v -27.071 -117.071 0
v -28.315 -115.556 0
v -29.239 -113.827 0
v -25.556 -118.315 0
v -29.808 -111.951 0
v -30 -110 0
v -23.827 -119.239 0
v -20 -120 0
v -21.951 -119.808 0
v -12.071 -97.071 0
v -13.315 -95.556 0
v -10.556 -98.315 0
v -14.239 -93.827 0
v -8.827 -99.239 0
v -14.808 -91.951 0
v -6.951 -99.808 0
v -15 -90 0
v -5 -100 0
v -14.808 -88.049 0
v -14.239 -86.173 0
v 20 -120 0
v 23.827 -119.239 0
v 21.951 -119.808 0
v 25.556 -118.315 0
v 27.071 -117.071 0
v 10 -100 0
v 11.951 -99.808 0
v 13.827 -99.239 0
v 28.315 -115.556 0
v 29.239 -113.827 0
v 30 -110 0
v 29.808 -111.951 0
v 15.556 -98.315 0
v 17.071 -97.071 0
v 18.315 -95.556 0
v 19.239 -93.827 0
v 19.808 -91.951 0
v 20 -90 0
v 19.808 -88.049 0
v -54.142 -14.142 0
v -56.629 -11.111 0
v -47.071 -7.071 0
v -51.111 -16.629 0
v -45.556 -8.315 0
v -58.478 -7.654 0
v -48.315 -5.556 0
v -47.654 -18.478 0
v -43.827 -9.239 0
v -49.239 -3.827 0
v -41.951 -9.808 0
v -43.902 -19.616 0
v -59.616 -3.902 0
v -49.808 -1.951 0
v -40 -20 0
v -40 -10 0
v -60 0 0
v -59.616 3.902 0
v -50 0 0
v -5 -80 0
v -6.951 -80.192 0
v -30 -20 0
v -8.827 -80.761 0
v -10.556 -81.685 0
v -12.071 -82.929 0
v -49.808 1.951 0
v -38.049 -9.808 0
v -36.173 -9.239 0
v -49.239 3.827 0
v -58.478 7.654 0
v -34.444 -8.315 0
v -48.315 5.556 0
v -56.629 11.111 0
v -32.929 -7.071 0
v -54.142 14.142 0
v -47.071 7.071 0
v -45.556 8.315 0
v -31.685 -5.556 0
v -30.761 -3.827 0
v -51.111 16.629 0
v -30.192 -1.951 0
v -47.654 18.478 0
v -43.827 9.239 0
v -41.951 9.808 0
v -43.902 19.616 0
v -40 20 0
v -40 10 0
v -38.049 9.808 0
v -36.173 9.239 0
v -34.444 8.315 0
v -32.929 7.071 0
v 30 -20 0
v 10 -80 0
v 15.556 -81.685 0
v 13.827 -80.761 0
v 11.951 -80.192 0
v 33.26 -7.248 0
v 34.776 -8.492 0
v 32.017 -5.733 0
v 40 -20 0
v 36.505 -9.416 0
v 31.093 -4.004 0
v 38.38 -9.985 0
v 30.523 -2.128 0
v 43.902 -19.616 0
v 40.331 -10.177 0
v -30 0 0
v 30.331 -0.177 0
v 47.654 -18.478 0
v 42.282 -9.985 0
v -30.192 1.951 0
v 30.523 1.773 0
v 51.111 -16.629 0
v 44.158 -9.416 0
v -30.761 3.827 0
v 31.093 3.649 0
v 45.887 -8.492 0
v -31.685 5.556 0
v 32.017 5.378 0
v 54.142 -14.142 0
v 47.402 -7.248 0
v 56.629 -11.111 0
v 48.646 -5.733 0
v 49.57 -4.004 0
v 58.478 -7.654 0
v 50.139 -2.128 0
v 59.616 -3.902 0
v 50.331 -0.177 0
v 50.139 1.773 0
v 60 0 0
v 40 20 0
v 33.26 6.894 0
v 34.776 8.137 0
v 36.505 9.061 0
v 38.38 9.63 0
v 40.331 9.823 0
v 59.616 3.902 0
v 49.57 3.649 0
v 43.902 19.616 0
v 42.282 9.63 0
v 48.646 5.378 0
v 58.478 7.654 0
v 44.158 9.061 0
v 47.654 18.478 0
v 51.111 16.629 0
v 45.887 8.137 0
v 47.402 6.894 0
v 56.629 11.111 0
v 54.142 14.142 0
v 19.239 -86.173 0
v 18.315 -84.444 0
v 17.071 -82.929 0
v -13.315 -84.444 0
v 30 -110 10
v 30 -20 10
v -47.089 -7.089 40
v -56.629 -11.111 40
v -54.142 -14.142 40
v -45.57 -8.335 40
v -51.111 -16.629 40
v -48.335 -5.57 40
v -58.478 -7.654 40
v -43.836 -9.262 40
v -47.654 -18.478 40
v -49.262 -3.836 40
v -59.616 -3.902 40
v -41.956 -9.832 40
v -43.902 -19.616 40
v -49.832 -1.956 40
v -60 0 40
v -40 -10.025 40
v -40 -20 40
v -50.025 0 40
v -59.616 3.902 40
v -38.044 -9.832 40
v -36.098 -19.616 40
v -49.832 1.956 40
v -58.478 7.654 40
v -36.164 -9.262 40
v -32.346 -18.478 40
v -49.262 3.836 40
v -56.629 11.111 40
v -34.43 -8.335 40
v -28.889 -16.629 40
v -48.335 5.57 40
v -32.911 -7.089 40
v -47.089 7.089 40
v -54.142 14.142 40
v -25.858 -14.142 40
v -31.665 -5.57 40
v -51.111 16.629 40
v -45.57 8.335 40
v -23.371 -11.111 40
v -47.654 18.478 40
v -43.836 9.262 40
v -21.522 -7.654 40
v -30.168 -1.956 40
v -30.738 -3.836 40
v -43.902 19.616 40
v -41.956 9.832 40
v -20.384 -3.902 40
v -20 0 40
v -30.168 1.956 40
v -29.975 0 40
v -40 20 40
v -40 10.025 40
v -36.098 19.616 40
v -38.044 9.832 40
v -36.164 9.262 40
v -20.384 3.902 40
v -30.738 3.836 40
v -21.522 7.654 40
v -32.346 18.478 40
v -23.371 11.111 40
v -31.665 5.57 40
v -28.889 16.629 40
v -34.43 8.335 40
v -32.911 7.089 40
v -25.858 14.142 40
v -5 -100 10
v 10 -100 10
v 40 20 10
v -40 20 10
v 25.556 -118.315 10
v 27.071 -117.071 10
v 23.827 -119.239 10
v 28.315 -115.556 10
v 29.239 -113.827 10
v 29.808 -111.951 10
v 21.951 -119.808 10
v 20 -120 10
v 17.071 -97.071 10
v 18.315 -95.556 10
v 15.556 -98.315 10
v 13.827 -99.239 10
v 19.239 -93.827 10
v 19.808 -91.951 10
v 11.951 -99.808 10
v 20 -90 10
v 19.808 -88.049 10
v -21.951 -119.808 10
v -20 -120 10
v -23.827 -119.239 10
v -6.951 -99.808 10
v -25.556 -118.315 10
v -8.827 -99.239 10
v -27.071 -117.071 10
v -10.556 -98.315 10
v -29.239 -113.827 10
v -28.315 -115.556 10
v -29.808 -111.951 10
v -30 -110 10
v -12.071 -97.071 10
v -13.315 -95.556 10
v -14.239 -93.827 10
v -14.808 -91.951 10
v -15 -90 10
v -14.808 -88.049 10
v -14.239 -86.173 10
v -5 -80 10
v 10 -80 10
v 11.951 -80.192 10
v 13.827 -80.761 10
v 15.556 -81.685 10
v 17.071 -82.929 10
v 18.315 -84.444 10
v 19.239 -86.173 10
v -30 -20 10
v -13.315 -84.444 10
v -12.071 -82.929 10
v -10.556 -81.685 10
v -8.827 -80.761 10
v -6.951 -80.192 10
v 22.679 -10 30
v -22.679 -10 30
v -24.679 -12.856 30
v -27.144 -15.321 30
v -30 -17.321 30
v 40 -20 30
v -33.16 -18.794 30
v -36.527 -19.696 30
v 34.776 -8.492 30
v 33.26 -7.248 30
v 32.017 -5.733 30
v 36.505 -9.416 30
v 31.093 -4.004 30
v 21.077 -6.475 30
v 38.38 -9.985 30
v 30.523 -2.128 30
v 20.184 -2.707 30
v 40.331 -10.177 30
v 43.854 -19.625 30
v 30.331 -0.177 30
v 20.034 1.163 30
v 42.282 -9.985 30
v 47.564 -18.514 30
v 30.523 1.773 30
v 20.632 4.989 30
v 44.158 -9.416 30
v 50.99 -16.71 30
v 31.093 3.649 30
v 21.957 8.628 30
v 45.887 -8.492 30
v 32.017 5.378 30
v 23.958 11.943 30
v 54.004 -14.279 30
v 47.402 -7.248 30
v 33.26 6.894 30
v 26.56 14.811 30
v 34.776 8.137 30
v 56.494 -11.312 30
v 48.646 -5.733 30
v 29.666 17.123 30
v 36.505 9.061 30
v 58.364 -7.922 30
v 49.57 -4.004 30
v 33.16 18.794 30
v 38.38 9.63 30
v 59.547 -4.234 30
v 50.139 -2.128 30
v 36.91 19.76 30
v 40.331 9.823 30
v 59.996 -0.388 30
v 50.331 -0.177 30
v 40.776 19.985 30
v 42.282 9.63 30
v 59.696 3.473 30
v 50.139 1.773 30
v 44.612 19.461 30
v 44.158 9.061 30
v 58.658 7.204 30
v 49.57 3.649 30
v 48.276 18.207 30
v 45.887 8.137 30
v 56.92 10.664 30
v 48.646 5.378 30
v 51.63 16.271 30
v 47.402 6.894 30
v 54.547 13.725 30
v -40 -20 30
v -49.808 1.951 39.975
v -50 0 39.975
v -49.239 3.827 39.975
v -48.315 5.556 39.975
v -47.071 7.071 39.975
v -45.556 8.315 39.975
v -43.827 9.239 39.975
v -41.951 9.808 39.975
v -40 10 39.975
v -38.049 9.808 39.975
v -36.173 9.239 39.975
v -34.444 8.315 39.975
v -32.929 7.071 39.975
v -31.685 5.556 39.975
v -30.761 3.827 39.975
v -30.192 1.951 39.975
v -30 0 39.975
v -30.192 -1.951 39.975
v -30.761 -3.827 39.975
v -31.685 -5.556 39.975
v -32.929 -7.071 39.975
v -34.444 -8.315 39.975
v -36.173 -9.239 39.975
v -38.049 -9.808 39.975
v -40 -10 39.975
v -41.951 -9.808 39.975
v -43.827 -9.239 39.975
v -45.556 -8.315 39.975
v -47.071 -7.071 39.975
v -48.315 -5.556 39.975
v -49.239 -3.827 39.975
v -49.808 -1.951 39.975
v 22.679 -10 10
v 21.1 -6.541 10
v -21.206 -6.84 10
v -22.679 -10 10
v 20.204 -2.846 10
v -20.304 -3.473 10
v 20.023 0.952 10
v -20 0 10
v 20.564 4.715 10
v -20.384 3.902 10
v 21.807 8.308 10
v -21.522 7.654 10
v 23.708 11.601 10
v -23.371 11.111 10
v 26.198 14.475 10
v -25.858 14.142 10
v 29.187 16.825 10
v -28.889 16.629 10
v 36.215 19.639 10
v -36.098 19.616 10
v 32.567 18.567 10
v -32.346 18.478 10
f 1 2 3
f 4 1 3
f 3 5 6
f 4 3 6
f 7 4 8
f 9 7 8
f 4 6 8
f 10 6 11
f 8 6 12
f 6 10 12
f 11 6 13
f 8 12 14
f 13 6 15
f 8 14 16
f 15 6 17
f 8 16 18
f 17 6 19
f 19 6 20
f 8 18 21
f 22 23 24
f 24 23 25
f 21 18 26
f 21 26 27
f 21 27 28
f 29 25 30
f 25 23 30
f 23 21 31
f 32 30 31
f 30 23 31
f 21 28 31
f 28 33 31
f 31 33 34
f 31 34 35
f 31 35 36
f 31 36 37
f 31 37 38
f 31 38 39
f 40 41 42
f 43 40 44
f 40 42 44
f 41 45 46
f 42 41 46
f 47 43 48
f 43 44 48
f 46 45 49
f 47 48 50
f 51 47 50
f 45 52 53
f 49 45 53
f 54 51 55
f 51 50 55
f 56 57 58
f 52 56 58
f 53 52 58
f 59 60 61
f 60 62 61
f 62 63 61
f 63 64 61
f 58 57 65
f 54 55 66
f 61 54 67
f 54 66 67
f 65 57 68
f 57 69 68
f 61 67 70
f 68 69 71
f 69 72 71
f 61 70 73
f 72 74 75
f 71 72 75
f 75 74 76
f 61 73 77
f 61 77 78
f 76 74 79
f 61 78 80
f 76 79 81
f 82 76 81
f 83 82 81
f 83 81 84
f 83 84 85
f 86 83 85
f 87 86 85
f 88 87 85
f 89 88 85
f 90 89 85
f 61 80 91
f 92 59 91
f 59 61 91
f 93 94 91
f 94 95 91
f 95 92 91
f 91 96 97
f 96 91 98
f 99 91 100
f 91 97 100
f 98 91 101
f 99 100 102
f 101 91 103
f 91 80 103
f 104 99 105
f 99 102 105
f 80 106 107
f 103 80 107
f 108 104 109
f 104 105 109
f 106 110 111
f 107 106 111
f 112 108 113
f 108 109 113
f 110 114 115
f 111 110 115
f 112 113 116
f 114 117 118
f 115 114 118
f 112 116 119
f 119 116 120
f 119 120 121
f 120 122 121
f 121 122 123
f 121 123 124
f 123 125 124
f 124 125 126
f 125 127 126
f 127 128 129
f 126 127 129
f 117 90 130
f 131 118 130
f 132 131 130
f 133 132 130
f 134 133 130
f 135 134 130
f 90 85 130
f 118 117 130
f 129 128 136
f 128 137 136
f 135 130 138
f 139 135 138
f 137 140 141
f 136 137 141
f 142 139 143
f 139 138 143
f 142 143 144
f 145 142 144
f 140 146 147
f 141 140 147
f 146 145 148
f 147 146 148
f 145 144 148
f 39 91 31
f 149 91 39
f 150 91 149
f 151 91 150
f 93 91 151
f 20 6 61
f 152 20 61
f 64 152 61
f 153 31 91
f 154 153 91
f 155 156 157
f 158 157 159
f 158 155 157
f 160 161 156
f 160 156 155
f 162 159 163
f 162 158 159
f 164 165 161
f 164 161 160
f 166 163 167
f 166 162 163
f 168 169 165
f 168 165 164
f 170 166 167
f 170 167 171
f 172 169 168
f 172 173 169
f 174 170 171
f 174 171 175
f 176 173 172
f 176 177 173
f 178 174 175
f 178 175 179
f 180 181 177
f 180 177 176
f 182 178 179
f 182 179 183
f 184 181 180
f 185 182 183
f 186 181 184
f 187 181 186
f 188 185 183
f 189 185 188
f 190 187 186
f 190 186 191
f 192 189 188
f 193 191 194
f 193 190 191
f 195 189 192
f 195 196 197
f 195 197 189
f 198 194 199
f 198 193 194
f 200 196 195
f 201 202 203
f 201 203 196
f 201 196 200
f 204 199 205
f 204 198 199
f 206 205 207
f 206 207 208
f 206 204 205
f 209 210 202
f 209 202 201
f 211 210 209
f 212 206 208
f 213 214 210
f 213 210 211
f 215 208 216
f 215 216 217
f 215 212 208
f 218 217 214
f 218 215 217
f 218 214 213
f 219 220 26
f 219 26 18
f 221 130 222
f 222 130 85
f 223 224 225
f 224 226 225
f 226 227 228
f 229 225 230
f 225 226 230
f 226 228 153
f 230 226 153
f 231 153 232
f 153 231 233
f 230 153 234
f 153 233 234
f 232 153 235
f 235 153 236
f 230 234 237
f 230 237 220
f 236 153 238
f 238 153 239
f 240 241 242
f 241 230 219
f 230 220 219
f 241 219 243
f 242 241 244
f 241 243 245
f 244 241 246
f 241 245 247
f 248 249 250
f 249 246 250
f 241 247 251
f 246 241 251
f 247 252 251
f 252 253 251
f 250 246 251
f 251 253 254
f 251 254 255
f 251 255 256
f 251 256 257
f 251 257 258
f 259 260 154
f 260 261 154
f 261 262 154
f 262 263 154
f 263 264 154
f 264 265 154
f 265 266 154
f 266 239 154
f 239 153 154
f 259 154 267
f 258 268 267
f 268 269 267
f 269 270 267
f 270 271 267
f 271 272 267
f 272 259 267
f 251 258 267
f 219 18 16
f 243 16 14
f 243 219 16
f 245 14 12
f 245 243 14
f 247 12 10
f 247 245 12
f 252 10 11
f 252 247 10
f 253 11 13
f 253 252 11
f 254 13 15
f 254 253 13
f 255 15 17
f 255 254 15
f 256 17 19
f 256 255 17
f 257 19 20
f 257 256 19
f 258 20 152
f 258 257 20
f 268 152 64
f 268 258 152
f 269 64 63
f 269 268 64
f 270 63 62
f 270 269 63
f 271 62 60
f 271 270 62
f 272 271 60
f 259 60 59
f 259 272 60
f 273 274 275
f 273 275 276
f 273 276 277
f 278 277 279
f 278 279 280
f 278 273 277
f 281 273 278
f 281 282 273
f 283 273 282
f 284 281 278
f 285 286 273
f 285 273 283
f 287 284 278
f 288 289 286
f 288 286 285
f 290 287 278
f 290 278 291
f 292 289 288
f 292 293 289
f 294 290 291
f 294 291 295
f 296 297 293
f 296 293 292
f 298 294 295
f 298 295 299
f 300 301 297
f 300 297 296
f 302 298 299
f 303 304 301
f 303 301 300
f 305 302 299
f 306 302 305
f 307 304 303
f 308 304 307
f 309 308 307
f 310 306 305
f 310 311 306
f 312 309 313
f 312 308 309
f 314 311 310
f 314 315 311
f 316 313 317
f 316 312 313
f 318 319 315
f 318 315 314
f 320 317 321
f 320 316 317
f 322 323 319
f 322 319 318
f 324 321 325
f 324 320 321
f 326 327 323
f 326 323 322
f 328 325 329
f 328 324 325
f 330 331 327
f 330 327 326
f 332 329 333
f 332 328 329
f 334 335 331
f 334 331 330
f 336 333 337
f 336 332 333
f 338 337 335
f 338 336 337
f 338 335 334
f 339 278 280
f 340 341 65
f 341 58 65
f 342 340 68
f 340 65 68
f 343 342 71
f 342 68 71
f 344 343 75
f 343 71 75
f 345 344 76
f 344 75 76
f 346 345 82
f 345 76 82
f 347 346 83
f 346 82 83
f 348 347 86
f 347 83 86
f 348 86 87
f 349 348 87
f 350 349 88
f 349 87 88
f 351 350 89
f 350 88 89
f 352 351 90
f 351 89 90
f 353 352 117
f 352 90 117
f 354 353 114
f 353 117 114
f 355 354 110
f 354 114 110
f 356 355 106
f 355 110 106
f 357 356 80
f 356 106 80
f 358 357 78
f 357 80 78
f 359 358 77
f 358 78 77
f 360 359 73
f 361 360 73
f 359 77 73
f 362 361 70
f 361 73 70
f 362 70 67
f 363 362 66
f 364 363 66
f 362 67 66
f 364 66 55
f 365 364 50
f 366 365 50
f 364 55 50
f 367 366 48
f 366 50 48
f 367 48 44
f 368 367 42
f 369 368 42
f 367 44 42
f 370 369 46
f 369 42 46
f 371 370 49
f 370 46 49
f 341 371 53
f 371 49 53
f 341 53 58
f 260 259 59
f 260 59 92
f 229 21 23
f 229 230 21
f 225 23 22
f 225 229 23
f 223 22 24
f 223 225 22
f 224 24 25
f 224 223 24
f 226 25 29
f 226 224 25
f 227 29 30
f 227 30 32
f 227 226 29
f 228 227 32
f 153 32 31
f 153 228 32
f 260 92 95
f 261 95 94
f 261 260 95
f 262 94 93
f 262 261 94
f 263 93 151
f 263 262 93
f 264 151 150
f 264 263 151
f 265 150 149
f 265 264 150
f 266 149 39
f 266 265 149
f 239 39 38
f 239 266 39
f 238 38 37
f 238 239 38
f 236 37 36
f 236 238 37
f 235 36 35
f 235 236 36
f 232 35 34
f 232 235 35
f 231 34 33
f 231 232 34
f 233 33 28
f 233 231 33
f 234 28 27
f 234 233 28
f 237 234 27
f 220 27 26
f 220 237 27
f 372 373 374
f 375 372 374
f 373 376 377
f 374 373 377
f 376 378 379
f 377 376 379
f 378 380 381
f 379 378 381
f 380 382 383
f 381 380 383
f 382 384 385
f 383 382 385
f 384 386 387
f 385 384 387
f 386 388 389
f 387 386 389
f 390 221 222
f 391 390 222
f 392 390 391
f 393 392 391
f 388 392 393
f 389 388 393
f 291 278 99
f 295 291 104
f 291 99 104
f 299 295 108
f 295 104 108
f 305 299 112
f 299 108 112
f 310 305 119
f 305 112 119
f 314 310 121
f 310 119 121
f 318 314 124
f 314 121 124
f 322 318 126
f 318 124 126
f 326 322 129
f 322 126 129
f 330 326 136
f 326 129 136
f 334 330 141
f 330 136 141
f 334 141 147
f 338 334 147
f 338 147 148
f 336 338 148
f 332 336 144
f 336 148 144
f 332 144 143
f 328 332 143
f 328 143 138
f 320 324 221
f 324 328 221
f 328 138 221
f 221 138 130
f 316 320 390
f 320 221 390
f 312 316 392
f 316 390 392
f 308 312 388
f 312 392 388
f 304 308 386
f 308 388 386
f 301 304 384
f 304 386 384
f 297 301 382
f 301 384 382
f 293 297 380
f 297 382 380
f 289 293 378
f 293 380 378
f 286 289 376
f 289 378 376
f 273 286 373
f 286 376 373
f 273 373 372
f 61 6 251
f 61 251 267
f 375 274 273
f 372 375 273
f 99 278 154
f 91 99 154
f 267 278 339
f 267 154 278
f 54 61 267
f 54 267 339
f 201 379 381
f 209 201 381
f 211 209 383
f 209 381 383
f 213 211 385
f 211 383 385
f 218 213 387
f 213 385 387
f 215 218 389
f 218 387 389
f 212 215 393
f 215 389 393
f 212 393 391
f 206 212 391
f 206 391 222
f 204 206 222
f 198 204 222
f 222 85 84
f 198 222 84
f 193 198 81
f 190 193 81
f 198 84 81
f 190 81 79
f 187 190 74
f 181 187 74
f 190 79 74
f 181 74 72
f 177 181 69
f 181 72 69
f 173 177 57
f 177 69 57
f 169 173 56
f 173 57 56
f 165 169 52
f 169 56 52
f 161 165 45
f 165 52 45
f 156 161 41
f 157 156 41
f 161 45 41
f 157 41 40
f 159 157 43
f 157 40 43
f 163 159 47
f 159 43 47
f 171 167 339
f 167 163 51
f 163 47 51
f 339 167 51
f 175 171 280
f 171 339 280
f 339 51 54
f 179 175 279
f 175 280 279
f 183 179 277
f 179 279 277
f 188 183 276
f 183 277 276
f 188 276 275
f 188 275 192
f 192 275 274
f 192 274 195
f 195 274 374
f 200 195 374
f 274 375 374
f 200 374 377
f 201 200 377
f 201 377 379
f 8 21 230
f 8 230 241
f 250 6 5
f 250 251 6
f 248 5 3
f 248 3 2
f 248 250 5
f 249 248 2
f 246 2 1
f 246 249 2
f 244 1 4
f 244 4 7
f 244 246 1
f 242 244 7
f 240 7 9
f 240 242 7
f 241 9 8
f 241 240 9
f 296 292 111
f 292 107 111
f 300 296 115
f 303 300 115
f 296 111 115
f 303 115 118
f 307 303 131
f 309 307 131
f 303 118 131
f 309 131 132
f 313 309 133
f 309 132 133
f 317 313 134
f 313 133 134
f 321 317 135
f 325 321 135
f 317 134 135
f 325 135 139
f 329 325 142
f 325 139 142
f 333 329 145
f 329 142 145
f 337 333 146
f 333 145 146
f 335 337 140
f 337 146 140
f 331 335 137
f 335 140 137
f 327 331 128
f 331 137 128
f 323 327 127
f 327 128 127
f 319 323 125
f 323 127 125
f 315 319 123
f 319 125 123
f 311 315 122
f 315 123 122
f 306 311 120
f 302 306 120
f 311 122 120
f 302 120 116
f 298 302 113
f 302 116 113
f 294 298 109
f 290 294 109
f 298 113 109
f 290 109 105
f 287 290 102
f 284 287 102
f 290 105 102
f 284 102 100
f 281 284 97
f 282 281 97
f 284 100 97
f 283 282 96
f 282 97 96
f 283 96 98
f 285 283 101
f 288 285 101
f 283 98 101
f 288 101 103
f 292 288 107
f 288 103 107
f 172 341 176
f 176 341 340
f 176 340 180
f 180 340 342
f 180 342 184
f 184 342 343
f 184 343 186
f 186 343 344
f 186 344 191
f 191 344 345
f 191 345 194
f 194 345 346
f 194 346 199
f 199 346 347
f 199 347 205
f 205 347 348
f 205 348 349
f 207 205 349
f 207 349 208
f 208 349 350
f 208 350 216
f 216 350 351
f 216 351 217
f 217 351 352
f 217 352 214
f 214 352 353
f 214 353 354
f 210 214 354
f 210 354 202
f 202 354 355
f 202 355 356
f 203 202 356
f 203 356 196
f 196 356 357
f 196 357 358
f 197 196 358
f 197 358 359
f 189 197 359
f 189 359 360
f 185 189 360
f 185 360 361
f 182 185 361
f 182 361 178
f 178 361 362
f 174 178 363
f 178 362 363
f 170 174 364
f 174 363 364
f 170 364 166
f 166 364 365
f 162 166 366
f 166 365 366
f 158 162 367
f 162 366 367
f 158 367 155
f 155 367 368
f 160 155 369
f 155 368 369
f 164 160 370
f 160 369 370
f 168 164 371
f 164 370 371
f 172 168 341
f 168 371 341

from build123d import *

# Parameters (mm, degrees)
SKETCH1_R                        = 20
BOSS_EXTRUDE1_DEPTH              = 40
SKETCH1_3_R                      = 20
BOSS_EXTRUDE2_DEPTH              = 30
SKETCH2_W                        = 80
SKETCH2_H                        = 40
BOSS_EXTRUDE3_DEPTH              = 10
SKETCH6_W                        = 80
SKETCH6_H                        = 10
BOSS_EXTRUDE4_DEPTH              = 30
F_20_0MM_DOWEL_HOLE1_D           = 20
F_20_0MM_DOWEL_HOLE1_CSINK_D     = 20.05
F_20_0MM_DOWEL_HOLE1_CSINK_ANGLE = 90
SKETCH11_W                       = 60
SKETCH11_H                       = 100
BOSS_EXTRUDE5_DEPTH              = 10
FILLET1_R                        = 10
FILLET2_R                        = 10
CUT_EXTRUDE2_REACH               = 139.477


with BuildPart() as part:
    # Sketch1 → Boss-Extrude1 (new body)
    with BuildSketch(Plane.XY):
        with Locations((-40, 0)):
            Circle(SKETCH1_R)
    extrude(amount=BOSS_EXTRUDE1_DEPTH)



with BuildPart() as body_2:
    # Sketch1<3> → Boss-Extrude2 (new body)
    with BuildSketch(Plane.XY):
        with Locations((40, 0)):
            Circle(SKETCH1_3_R)
    extrude(amount=BOSS_EXTRUDE2_DEPTH)


with BuildPart() as part_1:
    add(part.part)

    add(body_2.part)  # Boss-Extrude3 merges body 2
    # Sketch2 → Boss-Extrude3 (add)
    with BuildSketch(Plane(origin=(0, 0, 0), x_dir=(-1, 0, 0), z_dir=(0, 0, -1))):
        Rectangle(SKETCH2_W, SKETCH2_H)
    extrude(amount=-BOSS_EXTRUDE3_DEPTH)

    # Sketch6 → Boss-Extrude4 (add)
    with BuildSketch(Plane.XY.offset(30)):
        with Locations((0, -15)):
            Rectangle(SKETCH6_W, SKETCH6_H)
    extrude(amount=-BOSS_EXTRUDE4_DEPTH)

    # Ø20.0mm Dowel Hole1 (through all)
    with Locations(Plane.XY.offset(40)):
        with Locations((-40, 0), (40.331351324, -0.177410636)):
            CounterSinkHole(F_20_0MM_DOWEL_HOLE1_D / 2, F_20_0MM_DOWEL_HOLE1_CSINK_D / 2, counter_sink_angle=F_20_0MM_DOWEL_HOLE1_CSINK_ANGLE)

    # Sketch11 → Boss-Extrude5 (add)
    with BuildSketch(Plane(origin=(0, 0, 0), x_dir=(-1, 0, 0), z_dir=(0, 0, -1))):
        with Locations((0, -70)):
            Rectangle(SKETCH11_W, SKETCH11_H)
    extrude(amount=-BOSS_EXTRUDE5_DEPTH)

    # Fillet1
    fillet1_edges = [part_1.edges().sort_by_distance(p)[0] for p in [
        (-30, -120, 5),
    ]]
    fillet(fillet1_edges, radius=FILLET1_R)

    # Fillet2
    fillet2_edges = [part_1.edges().sort_by_distance(p)[0] for p in [
        (30, -120, 5),
    ]]
    fillet(fillet2_edges, radius=FILLET2_R)

    # Sketch12 → Cut-Extrude2 (cut, up to next)
    with BuildSketch(Plane.XY.offset(10), mode=Mode.PRIVATE) as cut_extrude2_sk1:
        with BuildLine():
            Line((-5, -80), (10, -80))
            ThreePointArc((10, -80), (20, -90), (10, -100))
            Line((10, -100), (-5, -100))
            ThreePointArc((-5, -100), (-15, -90), (-5, -80))
        make_face()
    cut_extrude2_tool1 = extrude(cut_extrude2_sk1.sketch, amount=-CUT_EXTRUDE2_REACH, mode=Mode.PRIVATE) & part_1.part
    add(cut_extrude2_tool1.solids().sort_by_distance((2.5, -90, 10))[0], mode=Mode.SUBTRACT)


solid = part_1.part
